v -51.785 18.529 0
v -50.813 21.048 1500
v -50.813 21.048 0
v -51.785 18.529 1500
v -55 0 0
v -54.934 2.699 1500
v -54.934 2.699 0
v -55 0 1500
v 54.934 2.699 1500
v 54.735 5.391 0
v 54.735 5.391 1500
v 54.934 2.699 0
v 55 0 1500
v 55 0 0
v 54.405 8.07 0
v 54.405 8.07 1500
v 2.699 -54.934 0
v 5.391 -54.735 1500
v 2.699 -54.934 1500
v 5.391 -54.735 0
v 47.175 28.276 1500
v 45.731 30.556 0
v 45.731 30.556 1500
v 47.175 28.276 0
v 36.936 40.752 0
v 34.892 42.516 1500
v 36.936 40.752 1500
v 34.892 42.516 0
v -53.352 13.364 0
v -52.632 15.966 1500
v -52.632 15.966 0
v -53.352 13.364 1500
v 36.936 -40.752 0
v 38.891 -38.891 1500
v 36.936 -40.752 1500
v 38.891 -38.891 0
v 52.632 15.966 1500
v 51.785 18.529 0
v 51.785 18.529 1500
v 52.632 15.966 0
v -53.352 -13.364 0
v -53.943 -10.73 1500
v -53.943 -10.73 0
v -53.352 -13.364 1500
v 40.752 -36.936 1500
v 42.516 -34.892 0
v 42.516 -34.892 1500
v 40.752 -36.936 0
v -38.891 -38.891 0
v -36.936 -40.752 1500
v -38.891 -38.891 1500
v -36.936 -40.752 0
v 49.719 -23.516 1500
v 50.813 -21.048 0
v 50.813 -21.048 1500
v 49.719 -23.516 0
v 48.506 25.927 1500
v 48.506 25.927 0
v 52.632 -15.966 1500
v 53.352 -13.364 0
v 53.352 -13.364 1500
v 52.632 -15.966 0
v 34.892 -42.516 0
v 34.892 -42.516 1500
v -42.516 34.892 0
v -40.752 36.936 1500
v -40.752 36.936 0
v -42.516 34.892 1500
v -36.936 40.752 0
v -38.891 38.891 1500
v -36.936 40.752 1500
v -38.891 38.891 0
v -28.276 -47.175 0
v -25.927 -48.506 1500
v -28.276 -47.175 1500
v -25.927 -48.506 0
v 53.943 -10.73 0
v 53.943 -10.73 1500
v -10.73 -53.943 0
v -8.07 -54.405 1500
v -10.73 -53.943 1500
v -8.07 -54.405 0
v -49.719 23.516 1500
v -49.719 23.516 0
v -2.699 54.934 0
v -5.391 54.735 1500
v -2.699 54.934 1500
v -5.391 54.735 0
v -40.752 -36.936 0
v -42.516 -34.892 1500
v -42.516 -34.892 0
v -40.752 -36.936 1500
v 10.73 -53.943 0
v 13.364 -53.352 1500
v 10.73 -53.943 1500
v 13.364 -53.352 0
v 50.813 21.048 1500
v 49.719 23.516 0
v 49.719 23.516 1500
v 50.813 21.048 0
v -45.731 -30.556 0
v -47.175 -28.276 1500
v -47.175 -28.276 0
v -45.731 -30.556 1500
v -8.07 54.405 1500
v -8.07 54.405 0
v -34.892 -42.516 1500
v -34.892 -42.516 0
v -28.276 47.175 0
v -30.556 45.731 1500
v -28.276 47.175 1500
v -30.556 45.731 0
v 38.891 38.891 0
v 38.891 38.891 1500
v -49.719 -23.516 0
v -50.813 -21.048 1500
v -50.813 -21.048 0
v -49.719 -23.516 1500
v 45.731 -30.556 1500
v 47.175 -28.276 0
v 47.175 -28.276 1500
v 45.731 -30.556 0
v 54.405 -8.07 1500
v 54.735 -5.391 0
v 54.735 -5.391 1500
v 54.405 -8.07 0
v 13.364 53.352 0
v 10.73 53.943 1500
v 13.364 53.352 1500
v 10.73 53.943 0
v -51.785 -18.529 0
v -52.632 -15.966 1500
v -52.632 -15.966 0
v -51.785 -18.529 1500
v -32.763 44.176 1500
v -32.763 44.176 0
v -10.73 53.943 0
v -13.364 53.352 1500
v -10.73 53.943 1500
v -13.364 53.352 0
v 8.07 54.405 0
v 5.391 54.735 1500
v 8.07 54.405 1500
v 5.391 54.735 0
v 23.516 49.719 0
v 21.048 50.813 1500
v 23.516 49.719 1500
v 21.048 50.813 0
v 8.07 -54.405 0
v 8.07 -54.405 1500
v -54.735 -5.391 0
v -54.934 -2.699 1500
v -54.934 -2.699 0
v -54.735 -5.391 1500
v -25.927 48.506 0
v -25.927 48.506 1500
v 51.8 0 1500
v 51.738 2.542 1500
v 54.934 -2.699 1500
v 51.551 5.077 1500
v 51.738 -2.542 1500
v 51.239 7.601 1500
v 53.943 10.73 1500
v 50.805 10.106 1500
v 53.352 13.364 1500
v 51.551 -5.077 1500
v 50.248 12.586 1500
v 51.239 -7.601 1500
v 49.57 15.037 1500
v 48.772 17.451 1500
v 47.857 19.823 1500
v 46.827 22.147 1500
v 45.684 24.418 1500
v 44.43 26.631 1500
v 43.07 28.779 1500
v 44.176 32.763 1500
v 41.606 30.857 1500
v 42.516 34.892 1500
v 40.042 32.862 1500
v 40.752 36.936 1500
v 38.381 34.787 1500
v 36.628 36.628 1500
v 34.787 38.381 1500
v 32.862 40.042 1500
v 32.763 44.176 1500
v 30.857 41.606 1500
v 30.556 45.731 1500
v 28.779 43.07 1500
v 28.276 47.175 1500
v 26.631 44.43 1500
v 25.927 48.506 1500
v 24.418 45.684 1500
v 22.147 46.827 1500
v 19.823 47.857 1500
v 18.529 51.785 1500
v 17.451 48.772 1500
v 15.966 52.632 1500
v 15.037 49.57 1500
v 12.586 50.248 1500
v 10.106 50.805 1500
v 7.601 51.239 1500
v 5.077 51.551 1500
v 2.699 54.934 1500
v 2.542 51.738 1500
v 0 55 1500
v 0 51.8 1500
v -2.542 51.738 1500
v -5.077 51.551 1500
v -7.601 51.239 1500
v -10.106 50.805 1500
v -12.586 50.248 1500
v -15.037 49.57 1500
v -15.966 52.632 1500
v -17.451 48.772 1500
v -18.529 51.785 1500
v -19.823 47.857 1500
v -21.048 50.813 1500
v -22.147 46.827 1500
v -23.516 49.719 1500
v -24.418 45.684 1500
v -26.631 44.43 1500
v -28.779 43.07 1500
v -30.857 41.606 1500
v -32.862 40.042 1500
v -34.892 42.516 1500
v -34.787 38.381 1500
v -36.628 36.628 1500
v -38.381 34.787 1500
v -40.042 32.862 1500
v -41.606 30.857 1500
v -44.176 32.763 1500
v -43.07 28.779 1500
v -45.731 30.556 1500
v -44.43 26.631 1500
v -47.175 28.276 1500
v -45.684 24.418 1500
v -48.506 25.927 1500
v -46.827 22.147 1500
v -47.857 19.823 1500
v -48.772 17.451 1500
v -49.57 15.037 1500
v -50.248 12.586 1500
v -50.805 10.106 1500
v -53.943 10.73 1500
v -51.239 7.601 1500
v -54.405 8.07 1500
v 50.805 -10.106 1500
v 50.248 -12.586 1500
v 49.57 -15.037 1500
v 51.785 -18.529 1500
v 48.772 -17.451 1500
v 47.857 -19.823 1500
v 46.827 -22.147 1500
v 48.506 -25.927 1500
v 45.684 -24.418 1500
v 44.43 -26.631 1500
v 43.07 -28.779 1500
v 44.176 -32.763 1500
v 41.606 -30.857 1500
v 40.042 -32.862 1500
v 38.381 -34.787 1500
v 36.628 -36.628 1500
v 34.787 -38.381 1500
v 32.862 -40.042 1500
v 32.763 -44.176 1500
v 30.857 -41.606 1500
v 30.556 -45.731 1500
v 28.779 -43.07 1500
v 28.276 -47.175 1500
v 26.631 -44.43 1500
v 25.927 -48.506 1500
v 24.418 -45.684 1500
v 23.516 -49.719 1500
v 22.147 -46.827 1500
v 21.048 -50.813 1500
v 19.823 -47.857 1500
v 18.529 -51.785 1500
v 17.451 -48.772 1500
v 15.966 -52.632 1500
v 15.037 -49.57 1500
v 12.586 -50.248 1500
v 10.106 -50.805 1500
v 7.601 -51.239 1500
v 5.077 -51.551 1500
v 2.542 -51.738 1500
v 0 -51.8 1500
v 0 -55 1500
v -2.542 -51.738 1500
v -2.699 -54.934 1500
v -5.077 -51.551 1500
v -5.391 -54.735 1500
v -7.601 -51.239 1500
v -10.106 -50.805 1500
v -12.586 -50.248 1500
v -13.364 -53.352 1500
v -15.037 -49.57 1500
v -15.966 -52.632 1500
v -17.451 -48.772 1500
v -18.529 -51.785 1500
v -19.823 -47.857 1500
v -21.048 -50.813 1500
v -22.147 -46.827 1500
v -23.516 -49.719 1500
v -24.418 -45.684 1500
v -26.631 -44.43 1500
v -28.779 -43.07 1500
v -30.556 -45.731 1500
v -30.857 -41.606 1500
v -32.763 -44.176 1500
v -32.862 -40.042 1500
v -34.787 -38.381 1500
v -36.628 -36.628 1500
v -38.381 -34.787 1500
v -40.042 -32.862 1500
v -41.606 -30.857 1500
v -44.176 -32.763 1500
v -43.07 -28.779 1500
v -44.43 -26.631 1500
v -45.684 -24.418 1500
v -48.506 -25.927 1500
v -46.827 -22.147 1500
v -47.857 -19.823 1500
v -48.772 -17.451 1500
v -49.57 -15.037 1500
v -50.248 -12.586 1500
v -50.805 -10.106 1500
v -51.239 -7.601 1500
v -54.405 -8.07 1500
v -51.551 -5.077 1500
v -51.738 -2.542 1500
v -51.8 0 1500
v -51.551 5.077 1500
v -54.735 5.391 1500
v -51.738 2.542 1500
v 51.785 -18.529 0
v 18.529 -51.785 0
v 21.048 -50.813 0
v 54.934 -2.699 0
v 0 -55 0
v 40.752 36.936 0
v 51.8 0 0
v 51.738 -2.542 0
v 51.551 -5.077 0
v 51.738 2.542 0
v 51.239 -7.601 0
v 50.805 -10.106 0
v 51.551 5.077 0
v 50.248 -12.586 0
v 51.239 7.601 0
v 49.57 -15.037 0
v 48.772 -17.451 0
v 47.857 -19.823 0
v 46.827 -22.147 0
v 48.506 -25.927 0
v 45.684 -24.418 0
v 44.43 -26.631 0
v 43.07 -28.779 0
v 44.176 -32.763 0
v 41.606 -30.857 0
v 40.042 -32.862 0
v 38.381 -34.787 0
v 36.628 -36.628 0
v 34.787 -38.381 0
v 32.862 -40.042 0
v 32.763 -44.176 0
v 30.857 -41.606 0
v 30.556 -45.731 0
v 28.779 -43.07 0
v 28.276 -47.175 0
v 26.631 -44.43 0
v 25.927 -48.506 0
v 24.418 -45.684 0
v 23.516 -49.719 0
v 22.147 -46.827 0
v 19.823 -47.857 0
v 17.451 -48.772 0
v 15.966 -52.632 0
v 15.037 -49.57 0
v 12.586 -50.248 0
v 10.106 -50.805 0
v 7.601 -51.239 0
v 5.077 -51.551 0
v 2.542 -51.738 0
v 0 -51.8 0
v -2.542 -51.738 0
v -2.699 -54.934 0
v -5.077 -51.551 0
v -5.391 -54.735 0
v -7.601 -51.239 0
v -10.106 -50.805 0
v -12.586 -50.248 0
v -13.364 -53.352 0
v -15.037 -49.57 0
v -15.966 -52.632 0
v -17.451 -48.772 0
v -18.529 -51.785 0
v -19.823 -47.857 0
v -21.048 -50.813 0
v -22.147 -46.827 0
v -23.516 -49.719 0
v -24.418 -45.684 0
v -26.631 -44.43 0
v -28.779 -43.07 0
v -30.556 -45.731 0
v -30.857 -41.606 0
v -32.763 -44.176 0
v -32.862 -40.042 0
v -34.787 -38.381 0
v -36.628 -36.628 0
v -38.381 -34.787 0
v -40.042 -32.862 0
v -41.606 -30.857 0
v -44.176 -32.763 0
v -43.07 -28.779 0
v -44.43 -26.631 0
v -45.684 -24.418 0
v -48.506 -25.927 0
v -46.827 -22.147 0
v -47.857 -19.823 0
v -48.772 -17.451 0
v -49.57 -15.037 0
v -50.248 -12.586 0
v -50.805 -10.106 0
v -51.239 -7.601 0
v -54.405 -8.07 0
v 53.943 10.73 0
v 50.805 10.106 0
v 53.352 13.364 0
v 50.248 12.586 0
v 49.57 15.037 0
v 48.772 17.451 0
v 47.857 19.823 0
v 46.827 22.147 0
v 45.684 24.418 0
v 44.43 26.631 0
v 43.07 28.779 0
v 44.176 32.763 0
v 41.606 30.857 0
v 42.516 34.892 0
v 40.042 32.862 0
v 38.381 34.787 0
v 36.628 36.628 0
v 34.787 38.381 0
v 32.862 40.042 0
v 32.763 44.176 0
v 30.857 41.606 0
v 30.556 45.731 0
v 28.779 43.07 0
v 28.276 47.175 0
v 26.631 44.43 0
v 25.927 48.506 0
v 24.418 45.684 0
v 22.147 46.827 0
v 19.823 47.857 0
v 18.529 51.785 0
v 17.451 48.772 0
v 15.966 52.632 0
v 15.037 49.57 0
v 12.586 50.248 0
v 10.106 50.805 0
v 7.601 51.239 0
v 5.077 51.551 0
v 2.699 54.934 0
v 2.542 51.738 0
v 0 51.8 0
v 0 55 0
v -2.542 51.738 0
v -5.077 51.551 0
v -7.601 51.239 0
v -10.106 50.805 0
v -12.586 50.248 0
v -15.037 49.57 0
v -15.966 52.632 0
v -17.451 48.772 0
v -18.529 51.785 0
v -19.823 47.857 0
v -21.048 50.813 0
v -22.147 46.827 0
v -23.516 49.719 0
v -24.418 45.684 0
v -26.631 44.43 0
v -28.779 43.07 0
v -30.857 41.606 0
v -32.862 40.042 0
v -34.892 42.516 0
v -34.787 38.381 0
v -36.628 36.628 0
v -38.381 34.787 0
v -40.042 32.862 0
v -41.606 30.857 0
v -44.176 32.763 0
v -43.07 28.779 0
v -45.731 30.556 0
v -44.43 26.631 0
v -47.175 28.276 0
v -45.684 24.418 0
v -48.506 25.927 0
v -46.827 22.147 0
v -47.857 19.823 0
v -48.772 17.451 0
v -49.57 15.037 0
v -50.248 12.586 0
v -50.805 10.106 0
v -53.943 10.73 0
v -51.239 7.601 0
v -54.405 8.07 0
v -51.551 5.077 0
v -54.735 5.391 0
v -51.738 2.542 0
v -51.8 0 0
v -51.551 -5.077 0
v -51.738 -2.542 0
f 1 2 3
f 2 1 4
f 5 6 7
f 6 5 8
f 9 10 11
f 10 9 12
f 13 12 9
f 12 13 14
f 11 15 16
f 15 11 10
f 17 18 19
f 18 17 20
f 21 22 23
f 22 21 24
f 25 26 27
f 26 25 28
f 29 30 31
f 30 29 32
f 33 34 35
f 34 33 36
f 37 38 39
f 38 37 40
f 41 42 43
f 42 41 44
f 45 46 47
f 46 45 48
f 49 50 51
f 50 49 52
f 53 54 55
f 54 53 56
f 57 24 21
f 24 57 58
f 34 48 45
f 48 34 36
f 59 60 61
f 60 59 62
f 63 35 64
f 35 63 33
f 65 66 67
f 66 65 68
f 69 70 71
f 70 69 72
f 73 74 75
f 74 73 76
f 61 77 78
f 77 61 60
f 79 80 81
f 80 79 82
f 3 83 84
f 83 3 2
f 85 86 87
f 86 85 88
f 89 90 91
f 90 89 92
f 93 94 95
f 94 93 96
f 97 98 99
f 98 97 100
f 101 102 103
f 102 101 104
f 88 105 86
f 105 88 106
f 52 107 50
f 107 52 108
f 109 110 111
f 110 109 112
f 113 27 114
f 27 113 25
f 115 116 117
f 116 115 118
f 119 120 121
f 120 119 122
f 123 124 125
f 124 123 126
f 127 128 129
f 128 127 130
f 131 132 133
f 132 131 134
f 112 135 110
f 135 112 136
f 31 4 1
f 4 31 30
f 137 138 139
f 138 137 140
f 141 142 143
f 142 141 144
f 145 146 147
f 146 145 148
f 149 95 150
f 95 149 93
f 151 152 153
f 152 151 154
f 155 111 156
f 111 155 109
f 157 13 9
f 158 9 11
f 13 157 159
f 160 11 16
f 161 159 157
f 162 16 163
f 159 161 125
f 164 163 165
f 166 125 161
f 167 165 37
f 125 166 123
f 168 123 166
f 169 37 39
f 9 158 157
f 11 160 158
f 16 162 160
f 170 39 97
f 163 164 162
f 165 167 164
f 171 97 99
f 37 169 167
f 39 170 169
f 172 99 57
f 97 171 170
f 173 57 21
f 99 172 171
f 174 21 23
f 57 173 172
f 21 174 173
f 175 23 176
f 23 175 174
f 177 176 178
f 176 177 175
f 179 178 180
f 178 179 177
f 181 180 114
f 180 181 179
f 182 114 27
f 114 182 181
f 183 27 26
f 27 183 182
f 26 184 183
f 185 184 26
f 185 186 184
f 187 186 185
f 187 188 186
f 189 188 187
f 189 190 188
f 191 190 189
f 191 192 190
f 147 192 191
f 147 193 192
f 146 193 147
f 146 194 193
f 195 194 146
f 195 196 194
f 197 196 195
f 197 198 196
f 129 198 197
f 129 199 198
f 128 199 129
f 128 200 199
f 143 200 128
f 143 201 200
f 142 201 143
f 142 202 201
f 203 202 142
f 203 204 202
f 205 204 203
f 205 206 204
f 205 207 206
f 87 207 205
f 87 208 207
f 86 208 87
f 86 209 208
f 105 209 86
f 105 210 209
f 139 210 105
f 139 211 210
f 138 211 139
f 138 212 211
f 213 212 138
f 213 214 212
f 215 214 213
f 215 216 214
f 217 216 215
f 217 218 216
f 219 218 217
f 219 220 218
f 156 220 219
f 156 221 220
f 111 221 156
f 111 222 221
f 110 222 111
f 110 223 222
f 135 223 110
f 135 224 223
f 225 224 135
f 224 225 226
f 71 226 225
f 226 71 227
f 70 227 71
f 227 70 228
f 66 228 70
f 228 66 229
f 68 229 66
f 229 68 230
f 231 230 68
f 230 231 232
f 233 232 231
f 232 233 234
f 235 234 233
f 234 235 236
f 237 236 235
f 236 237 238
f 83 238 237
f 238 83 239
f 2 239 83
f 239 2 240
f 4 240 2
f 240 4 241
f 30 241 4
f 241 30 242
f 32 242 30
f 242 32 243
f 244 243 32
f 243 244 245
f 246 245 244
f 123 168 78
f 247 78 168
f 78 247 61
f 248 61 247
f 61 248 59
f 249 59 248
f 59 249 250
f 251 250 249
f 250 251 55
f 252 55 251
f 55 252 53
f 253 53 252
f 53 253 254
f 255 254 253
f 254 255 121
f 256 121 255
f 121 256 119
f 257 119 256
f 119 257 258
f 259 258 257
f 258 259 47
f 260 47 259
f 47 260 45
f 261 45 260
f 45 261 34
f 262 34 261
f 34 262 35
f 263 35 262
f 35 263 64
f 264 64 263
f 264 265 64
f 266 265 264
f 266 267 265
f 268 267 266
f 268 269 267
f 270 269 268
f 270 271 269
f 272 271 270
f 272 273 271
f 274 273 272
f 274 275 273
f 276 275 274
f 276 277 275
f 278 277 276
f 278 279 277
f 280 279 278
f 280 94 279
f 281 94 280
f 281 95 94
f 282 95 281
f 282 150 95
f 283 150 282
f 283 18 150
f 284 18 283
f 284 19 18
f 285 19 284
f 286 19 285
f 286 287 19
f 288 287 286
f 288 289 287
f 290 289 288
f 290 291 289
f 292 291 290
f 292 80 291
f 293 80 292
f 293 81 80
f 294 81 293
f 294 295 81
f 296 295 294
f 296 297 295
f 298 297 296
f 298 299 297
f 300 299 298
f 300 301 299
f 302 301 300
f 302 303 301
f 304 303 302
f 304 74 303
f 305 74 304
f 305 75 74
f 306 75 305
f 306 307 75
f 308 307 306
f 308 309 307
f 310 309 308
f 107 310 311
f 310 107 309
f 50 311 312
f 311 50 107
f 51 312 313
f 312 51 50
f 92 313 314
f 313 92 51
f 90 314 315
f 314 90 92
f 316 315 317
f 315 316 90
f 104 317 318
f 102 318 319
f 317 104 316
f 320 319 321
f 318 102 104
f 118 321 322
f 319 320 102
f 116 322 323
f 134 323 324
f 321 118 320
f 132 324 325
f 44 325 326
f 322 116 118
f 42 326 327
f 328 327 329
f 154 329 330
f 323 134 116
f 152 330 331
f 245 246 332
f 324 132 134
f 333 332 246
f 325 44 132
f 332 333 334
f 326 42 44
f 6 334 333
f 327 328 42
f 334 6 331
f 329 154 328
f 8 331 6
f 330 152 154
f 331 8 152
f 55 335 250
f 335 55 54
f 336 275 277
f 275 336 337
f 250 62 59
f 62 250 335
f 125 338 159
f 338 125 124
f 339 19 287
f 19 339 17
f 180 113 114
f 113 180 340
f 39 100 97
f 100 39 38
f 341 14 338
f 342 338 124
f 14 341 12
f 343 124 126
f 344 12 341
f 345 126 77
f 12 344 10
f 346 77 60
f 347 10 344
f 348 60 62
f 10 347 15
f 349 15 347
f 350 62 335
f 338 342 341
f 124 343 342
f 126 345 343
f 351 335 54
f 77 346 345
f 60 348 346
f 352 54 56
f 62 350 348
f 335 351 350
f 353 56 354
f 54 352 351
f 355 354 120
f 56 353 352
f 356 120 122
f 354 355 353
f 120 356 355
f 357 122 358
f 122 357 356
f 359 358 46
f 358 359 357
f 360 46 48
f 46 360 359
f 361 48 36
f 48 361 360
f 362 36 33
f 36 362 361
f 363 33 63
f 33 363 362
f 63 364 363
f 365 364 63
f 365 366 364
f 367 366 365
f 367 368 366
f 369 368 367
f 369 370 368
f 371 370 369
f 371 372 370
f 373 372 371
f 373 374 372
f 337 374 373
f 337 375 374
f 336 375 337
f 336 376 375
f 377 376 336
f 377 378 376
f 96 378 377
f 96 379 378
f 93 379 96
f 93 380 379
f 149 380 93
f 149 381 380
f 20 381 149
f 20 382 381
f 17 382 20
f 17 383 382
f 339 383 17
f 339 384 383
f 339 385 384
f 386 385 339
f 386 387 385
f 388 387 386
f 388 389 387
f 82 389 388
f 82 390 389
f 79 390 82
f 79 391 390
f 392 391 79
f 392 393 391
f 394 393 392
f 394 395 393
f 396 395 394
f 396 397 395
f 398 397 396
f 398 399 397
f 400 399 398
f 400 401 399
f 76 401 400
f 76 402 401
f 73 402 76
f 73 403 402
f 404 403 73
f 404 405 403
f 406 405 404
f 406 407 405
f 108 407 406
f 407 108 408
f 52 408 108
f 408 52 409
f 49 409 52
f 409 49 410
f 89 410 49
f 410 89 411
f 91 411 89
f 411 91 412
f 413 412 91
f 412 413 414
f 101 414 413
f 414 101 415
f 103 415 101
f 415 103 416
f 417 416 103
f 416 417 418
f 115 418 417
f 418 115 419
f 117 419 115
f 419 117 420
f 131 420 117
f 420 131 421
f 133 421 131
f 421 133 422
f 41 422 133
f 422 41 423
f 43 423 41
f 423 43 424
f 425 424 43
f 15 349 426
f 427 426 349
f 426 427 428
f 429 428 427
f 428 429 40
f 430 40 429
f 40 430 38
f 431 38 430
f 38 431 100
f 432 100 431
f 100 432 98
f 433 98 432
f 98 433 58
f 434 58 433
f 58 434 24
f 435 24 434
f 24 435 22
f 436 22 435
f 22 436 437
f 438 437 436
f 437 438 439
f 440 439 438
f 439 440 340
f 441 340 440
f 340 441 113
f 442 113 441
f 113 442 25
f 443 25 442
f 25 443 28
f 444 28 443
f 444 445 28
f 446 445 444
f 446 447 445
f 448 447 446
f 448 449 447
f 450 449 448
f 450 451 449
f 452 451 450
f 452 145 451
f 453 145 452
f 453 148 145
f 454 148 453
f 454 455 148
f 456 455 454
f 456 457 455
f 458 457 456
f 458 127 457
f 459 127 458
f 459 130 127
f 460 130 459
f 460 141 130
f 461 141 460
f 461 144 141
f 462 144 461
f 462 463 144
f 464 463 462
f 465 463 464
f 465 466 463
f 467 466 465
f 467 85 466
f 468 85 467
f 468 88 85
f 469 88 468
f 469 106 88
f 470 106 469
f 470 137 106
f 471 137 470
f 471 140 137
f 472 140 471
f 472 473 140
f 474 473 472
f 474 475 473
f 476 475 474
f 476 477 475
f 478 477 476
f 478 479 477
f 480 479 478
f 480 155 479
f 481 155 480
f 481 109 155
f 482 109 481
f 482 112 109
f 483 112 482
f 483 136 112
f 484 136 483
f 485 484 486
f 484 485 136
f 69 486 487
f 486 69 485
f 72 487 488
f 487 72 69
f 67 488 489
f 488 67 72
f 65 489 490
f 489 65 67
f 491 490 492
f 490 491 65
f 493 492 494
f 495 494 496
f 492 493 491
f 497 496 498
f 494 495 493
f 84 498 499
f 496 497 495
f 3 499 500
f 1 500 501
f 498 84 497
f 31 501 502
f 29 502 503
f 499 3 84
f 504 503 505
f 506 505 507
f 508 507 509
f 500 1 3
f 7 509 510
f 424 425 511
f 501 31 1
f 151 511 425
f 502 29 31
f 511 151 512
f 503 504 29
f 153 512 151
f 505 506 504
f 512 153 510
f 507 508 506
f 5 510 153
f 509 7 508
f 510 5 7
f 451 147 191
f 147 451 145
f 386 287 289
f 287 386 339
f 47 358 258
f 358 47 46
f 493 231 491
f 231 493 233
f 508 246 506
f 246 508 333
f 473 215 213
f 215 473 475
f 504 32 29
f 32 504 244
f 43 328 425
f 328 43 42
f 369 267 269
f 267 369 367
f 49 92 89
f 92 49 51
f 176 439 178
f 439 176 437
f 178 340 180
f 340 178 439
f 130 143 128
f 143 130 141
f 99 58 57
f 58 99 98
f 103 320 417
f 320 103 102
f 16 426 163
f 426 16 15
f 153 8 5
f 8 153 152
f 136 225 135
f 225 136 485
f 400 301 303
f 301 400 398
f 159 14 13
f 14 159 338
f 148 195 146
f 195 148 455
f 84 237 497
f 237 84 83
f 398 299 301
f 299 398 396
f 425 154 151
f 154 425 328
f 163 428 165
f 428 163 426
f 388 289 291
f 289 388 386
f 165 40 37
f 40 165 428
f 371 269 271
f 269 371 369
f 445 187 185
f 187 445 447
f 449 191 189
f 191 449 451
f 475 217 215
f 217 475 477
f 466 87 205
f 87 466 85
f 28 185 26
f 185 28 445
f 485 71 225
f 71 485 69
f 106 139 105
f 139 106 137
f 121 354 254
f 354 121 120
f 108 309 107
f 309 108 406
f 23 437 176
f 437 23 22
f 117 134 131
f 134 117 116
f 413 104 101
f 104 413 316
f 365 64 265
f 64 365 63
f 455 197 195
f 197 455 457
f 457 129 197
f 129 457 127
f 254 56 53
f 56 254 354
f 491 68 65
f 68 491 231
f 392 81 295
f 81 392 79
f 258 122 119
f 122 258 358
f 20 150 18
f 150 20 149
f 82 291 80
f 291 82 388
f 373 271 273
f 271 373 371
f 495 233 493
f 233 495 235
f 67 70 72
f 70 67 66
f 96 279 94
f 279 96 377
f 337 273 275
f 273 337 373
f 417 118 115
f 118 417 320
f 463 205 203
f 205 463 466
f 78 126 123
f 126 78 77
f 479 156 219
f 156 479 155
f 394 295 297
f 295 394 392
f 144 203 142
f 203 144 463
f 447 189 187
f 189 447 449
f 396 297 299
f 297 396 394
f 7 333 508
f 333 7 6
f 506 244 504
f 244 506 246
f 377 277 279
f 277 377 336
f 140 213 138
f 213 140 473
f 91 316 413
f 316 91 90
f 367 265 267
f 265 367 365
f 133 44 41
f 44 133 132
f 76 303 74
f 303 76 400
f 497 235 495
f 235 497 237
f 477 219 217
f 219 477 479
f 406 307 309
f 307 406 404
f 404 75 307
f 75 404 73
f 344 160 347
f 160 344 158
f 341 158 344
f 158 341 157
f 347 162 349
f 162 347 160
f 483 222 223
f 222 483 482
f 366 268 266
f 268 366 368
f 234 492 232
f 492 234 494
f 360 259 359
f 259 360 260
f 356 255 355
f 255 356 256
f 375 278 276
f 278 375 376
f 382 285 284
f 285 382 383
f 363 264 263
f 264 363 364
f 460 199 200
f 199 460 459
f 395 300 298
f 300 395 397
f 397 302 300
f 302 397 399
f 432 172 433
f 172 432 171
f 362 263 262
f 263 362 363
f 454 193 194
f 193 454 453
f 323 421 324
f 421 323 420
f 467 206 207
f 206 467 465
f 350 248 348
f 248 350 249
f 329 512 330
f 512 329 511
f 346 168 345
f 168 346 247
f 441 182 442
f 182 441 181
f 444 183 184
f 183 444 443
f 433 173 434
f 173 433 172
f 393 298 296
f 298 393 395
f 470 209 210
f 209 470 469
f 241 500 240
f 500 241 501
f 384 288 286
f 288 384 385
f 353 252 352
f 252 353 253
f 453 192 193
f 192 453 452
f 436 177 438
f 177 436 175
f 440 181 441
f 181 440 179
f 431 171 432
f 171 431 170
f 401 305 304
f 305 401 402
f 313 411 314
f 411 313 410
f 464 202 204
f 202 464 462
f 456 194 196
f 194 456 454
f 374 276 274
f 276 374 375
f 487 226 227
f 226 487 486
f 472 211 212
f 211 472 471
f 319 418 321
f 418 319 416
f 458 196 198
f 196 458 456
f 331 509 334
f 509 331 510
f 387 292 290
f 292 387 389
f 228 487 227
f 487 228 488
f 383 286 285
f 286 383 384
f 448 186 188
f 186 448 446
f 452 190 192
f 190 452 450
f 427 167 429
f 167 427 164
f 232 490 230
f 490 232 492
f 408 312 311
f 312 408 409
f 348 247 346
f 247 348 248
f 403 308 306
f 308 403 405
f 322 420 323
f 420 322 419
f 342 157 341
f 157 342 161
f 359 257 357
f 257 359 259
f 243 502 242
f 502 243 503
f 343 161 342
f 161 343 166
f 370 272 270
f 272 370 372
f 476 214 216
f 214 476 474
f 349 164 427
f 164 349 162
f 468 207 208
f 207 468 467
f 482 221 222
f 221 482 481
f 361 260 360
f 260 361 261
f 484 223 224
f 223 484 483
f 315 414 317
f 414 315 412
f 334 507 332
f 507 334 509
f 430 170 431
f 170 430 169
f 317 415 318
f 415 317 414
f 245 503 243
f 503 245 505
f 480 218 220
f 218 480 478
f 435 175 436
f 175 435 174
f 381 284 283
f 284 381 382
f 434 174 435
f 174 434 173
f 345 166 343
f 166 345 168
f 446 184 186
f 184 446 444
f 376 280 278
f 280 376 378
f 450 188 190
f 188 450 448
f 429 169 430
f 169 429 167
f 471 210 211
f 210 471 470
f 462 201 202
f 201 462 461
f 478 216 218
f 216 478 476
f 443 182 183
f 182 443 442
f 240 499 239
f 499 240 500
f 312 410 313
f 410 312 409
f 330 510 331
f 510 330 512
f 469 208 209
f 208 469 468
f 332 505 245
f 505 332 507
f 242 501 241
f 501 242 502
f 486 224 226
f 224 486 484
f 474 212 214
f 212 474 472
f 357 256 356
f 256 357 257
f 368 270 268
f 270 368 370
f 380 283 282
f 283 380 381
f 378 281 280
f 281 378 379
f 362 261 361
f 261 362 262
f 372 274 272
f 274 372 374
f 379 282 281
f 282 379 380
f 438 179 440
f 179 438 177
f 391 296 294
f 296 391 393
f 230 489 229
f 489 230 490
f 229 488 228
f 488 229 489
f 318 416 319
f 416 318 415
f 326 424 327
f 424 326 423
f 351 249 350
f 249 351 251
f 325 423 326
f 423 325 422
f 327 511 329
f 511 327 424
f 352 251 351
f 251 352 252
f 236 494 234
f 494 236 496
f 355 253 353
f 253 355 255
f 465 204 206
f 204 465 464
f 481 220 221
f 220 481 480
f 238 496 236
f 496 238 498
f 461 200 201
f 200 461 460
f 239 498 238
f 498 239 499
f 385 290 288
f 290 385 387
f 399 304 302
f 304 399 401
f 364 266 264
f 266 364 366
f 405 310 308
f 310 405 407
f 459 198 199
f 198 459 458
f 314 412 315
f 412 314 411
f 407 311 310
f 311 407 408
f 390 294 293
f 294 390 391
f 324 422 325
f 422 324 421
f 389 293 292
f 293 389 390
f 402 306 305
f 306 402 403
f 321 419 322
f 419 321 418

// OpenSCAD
$fn = 128;

// HT pipe parameters (approximate for HT 110)
pipe_length = 1500;          // mm
outer_diameter = 110;        // mm (nominal)
wall_thickness = 3.2;        // mm (typical for HT DN110)
inner_diameter = outer_diameter - 2*wall_thickness;

module ht_pipe(od, id, len) {
    difference() {
        cylinder(h = len, d = od);
        translate([0,0,-0.5])
            cylinder(h = len + 1, d = id);
    }
}

ht_pipe(outer_diameter, inner_diameter, pipe_length);
